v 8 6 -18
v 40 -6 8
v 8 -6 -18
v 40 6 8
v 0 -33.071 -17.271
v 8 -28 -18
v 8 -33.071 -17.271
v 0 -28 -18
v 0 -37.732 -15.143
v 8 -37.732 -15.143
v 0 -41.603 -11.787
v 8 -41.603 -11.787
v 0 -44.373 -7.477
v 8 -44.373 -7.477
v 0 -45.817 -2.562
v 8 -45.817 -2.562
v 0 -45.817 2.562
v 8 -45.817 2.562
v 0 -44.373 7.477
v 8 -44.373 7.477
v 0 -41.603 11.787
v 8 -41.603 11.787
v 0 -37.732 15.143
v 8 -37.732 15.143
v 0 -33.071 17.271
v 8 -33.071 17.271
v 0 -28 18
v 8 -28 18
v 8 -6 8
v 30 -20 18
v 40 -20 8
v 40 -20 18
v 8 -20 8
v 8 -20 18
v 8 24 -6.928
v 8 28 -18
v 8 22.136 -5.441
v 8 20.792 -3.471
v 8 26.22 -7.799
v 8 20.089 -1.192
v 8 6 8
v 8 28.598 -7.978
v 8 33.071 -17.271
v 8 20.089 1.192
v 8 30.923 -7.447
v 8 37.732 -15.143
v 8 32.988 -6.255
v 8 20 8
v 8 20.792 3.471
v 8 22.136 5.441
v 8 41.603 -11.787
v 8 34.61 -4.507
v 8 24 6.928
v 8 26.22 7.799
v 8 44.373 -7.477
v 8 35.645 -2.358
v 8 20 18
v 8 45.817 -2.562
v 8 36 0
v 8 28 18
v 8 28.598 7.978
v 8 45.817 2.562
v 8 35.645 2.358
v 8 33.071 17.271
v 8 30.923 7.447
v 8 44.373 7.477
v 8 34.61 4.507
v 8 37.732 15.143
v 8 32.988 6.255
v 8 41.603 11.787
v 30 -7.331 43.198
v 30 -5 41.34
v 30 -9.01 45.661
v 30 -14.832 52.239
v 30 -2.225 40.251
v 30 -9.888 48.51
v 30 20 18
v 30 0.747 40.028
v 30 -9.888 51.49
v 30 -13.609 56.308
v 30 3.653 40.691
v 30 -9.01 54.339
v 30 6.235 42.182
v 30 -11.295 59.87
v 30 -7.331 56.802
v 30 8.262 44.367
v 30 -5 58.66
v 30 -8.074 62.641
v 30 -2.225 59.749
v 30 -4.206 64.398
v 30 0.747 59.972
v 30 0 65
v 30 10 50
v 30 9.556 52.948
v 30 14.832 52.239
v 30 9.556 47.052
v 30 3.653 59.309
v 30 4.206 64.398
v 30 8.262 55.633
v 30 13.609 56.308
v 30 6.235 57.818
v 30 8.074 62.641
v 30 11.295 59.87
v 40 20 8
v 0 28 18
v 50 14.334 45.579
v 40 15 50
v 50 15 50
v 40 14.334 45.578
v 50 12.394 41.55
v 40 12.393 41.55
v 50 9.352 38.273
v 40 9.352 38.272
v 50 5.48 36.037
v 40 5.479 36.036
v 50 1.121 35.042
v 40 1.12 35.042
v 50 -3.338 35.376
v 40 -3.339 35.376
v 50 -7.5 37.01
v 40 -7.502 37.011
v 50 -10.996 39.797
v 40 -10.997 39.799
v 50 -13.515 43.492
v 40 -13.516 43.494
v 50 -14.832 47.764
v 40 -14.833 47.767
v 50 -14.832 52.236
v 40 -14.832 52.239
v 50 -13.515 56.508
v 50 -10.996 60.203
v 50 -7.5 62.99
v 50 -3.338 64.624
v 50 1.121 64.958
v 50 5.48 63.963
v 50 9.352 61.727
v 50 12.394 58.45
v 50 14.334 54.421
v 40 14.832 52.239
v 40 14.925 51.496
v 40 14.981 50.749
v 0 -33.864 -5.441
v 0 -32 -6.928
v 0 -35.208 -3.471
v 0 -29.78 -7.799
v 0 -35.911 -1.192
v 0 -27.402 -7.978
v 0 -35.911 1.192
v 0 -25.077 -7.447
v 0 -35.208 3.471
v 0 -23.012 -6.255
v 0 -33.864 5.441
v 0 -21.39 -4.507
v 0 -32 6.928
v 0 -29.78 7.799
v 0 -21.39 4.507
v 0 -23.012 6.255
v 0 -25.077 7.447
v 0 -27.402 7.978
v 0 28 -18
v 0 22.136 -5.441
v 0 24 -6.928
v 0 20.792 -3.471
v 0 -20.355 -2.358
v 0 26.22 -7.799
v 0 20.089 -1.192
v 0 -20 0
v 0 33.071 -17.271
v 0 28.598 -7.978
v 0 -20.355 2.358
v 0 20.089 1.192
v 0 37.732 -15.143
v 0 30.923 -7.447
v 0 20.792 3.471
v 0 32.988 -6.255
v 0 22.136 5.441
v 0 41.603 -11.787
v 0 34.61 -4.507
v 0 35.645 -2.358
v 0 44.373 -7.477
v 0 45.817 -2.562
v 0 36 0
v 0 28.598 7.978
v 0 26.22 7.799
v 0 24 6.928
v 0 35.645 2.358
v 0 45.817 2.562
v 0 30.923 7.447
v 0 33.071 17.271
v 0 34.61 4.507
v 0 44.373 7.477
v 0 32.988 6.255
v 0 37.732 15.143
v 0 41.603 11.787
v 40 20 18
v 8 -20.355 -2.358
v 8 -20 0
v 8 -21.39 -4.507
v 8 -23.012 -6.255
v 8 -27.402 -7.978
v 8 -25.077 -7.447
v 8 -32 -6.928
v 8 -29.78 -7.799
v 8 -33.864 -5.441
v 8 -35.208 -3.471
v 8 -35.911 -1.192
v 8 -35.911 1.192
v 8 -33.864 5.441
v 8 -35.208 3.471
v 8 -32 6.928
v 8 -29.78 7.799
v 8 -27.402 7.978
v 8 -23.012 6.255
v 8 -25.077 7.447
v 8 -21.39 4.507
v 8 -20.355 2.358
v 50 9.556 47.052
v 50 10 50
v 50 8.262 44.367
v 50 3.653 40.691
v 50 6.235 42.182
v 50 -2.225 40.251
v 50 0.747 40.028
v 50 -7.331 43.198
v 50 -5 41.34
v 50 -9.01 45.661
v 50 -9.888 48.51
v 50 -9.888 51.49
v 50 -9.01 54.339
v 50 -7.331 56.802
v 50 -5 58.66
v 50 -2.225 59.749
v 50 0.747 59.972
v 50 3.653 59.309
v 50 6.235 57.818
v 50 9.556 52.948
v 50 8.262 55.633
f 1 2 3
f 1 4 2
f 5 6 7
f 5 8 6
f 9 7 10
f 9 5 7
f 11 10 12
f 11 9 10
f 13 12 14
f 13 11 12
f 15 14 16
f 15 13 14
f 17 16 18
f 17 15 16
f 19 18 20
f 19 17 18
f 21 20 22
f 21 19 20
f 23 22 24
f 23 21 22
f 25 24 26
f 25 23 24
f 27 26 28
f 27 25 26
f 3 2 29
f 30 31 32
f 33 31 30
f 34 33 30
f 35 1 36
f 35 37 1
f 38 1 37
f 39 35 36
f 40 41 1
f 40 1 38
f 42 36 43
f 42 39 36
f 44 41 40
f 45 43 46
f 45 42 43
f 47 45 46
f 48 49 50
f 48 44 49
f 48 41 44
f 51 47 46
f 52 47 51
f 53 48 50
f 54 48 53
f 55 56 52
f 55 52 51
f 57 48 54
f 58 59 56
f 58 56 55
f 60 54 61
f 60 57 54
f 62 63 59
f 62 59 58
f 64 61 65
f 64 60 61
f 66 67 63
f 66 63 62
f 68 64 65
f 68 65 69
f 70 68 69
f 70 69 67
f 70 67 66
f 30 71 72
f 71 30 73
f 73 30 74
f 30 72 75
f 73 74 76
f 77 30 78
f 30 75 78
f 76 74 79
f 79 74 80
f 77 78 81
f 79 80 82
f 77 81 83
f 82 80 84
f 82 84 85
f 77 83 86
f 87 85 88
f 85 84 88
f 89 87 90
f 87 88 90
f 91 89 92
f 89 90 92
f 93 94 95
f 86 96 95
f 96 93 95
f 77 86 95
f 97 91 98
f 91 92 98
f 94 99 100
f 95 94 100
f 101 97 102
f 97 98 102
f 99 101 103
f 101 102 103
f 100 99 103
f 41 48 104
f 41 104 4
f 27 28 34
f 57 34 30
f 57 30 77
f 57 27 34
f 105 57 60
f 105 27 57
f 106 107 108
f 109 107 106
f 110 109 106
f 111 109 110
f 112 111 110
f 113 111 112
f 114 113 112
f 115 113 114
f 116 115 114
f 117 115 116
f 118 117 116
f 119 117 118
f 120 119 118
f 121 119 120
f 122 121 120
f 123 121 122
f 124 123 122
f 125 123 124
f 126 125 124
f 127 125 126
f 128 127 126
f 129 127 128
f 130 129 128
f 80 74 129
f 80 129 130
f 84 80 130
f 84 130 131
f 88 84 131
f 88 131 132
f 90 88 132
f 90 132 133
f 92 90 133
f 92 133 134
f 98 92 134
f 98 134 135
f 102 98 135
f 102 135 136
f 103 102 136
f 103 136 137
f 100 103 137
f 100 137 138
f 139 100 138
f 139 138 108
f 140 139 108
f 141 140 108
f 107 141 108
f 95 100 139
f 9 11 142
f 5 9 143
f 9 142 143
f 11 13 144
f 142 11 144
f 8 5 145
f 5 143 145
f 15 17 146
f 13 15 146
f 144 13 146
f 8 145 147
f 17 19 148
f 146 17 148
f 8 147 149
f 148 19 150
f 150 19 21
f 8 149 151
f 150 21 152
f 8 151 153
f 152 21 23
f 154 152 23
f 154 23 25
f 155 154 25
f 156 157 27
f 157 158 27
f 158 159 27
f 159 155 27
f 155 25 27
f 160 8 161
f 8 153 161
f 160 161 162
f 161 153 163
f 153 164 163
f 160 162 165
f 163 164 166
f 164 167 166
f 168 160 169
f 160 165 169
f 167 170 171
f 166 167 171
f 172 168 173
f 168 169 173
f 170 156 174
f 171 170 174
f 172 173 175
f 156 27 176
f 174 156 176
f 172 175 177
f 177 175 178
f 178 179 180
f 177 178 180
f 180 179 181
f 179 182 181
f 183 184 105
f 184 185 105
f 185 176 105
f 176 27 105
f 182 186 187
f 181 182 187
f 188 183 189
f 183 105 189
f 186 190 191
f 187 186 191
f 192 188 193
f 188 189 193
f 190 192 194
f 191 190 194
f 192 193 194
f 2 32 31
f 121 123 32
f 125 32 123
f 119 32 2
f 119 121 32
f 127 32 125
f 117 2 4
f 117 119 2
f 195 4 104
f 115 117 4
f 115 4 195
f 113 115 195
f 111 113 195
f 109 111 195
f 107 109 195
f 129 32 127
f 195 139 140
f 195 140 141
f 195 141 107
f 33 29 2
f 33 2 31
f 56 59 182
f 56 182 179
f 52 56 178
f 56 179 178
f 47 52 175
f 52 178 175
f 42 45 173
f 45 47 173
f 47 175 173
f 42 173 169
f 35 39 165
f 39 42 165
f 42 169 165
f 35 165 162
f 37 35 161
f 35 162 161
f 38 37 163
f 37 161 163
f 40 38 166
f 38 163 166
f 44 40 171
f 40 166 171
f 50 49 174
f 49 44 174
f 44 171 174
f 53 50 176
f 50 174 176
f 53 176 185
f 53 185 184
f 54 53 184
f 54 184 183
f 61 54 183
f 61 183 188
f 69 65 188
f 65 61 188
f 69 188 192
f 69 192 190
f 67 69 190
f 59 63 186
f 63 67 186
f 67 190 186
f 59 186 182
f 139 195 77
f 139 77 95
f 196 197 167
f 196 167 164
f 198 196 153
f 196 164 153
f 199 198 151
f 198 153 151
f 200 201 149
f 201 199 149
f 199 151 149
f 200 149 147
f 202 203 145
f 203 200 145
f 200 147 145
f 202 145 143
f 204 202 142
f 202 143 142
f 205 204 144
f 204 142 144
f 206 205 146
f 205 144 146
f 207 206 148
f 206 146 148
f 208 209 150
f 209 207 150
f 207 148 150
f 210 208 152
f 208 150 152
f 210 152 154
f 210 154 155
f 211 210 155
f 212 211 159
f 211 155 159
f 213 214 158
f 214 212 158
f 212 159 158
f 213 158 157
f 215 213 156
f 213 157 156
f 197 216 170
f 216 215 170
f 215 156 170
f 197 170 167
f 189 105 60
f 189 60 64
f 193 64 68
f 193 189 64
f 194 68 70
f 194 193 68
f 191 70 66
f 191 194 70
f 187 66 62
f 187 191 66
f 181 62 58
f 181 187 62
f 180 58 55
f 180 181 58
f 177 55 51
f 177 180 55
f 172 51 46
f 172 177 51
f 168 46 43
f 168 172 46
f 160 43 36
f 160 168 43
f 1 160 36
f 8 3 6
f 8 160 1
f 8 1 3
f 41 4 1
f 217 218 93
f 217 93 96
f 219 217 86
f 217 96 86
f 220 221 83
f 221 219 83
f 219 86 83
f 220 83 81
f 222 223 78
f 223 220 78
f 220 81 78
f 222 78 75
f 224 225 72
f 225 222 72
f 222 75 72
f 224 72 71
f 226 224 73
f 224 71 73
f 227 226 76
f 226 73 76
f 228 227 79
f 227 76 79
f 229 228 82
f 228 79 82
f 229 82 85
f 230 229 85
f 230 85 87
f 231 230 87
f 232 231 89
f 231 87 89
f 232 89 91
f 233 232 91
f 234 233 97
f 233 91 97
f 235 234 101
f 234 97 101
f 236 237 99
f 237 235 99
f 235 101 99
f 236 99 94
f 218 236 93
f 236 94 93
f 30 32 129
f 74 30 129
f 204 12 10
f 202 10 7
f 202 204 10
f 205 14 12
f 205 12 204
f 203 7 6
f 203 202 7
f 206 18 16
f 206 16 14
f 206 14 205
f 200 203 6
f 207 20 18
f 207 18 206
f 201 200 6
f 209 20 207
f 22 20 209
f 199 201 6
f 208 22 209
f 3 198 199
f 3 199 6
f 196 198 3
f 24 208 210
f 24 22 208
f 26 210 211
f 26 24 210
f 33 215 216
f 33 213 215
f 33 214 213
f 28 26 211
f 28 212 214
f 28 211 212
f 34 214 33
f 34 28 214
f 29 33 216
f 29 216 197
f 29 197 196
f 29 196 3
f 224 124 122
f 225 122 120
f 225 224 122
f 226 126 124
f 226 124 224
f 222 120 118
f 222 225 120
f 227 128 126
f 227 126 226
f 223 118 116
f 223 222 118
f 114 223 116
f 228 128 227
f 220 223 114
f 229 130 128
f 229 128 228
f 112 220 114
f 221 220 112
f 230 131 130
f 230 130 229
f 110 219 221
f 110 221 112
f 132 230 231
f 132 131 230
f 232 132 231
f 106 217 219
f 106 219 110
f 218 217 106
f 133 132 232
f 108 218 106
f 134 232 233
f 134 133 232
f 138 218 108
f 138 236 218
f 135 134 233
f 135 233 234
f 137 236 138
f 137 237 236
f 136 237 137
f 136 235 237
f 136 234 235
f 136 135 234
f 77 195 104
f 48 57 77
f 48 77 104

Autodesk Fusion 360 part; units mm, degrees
sketch "Sketch1" plane through (0, 0, 0) normal (1, 0, 0) x (0, 1, 0)
  line L0 (28, -18) -> (-28, -18)
  line L1 (-28, 18) -> (28, 18)
  line L2 (28, -18) -> (-28, 18) construction
  line L3 (-28, -18) -> (28, 18) construction
  circle A0 centre (-28, 0) radius 8
  circle A1 centre (28, 0) radius 8
  arc A2 (-28, 18) -> (-28, -18) centre (-28, 0) ccw
  arc A3 (28, -18) -> (28, 18) centre (28, 0) ccw
  dimension "d1" = 56
  dimension "d2" = 36
  dimension "d3" = 36
  dimension "d4" = 36
  dimension "d5" = 16
  dimension "d6" = 16
extrude "Extrude1" add sketch "Sketch1" along normal blind 8
sketch "Sketch2" plane through (8, 0, 0) normal (1, 0, 0) x (0, 1, 0)
  circle A0 centre (-28, 0) radius 8
  circle A1 centre (28, 0) radius 8
  arc A2 (-28, 18) -> (-28, -18) centre (-28, 0) ccw
  line L0 (-28, -18) -> (28, -18)
  arc A3 (28, -18) -> (28, 18) centre (28, 0) ccw
  line L1 (28, 18) -> (-28, 18)
  line L2 (20, 8) -> (-20, 8)
  line L3 (-20, 8) -> (-20, 18)
  line L4 (20, 18) -> (20, 8)
extrude "Extrude2" add sketch "Sketch2" along normal blind 32 contours L1 L2 L3 L4
sketch "Sketch3" plane through (40, 0, 0) normal (1, 0, 0) x (0, 1, 0)
  line L0 (20, 18) -> (-20, 18)
  line L1 (-20, 18) -> (-20, 8)
  line L2 (-20, 8) -> (20, 8)
  line L3 (20, 8) -> (20, 18)
  circle A0 centre (0, 50) radius 10
  line L4 (-20, 18) -> (-14.832, 52.2387)
  line L5 (20, 18) -> (14.832, 52.2387)
  arc A1 (14.832, 52.2387) -> (-14.832, 52.2387) centre (0, 50) ccw
  dimension "d12" = 30
  dimension "d13" = 20
  dimension "d14" = 32
extrude "Extrude3" add sketch "Sketch3" against normal blind 10 contours L0 L4 L5 A1
sketch "Sketch4" plane through (40, 0, 0) normal (1, 0, 0) x (0, 1, 0)
  circle A0 centre (0, 50) radius 10
  line L0 (-20, 18) -> (-20, 8)
  line L1 (-20, 8) -> (20, 8)
  line L2 (20, 8) -> (20, 18)
  line L3 (20, 18) -> (14.832, 52.2387)
  arc A1 (14.832, 52.2387) -> (-14.832, 52.2387) centre (0, 50) ccw
  line L4 (-14.832, 52.2387) -> (-20, 18)
  circle A2 centre (0, 50) radius 15
  dimension "d17" = 30
extrude "Extrude4" add sketch "Sketch4" along normal blind 10 contours A1 A2
ref_plane "WorkPlane1" through (24, 0, 13) normal (0, -1, 0) x (0, 0, -1)
sketch "Sketch5" plane through (0, 0, 0) normal (0, -1, 0) x (-1, 0, 0)
  line L0 (-40, -8) -> (-8, 18)
  line L1 (-8, 18) -> (-8, -8)
  line L2 (-8, -8) -> (-40, -8)
  point P0 (-40, -8)
  point P1 (-8, -8)
  point P2 (-8, 18)
extrude "Extrude5" add sketch "Sketch5" along normal blind 6 and the other way blind 6
